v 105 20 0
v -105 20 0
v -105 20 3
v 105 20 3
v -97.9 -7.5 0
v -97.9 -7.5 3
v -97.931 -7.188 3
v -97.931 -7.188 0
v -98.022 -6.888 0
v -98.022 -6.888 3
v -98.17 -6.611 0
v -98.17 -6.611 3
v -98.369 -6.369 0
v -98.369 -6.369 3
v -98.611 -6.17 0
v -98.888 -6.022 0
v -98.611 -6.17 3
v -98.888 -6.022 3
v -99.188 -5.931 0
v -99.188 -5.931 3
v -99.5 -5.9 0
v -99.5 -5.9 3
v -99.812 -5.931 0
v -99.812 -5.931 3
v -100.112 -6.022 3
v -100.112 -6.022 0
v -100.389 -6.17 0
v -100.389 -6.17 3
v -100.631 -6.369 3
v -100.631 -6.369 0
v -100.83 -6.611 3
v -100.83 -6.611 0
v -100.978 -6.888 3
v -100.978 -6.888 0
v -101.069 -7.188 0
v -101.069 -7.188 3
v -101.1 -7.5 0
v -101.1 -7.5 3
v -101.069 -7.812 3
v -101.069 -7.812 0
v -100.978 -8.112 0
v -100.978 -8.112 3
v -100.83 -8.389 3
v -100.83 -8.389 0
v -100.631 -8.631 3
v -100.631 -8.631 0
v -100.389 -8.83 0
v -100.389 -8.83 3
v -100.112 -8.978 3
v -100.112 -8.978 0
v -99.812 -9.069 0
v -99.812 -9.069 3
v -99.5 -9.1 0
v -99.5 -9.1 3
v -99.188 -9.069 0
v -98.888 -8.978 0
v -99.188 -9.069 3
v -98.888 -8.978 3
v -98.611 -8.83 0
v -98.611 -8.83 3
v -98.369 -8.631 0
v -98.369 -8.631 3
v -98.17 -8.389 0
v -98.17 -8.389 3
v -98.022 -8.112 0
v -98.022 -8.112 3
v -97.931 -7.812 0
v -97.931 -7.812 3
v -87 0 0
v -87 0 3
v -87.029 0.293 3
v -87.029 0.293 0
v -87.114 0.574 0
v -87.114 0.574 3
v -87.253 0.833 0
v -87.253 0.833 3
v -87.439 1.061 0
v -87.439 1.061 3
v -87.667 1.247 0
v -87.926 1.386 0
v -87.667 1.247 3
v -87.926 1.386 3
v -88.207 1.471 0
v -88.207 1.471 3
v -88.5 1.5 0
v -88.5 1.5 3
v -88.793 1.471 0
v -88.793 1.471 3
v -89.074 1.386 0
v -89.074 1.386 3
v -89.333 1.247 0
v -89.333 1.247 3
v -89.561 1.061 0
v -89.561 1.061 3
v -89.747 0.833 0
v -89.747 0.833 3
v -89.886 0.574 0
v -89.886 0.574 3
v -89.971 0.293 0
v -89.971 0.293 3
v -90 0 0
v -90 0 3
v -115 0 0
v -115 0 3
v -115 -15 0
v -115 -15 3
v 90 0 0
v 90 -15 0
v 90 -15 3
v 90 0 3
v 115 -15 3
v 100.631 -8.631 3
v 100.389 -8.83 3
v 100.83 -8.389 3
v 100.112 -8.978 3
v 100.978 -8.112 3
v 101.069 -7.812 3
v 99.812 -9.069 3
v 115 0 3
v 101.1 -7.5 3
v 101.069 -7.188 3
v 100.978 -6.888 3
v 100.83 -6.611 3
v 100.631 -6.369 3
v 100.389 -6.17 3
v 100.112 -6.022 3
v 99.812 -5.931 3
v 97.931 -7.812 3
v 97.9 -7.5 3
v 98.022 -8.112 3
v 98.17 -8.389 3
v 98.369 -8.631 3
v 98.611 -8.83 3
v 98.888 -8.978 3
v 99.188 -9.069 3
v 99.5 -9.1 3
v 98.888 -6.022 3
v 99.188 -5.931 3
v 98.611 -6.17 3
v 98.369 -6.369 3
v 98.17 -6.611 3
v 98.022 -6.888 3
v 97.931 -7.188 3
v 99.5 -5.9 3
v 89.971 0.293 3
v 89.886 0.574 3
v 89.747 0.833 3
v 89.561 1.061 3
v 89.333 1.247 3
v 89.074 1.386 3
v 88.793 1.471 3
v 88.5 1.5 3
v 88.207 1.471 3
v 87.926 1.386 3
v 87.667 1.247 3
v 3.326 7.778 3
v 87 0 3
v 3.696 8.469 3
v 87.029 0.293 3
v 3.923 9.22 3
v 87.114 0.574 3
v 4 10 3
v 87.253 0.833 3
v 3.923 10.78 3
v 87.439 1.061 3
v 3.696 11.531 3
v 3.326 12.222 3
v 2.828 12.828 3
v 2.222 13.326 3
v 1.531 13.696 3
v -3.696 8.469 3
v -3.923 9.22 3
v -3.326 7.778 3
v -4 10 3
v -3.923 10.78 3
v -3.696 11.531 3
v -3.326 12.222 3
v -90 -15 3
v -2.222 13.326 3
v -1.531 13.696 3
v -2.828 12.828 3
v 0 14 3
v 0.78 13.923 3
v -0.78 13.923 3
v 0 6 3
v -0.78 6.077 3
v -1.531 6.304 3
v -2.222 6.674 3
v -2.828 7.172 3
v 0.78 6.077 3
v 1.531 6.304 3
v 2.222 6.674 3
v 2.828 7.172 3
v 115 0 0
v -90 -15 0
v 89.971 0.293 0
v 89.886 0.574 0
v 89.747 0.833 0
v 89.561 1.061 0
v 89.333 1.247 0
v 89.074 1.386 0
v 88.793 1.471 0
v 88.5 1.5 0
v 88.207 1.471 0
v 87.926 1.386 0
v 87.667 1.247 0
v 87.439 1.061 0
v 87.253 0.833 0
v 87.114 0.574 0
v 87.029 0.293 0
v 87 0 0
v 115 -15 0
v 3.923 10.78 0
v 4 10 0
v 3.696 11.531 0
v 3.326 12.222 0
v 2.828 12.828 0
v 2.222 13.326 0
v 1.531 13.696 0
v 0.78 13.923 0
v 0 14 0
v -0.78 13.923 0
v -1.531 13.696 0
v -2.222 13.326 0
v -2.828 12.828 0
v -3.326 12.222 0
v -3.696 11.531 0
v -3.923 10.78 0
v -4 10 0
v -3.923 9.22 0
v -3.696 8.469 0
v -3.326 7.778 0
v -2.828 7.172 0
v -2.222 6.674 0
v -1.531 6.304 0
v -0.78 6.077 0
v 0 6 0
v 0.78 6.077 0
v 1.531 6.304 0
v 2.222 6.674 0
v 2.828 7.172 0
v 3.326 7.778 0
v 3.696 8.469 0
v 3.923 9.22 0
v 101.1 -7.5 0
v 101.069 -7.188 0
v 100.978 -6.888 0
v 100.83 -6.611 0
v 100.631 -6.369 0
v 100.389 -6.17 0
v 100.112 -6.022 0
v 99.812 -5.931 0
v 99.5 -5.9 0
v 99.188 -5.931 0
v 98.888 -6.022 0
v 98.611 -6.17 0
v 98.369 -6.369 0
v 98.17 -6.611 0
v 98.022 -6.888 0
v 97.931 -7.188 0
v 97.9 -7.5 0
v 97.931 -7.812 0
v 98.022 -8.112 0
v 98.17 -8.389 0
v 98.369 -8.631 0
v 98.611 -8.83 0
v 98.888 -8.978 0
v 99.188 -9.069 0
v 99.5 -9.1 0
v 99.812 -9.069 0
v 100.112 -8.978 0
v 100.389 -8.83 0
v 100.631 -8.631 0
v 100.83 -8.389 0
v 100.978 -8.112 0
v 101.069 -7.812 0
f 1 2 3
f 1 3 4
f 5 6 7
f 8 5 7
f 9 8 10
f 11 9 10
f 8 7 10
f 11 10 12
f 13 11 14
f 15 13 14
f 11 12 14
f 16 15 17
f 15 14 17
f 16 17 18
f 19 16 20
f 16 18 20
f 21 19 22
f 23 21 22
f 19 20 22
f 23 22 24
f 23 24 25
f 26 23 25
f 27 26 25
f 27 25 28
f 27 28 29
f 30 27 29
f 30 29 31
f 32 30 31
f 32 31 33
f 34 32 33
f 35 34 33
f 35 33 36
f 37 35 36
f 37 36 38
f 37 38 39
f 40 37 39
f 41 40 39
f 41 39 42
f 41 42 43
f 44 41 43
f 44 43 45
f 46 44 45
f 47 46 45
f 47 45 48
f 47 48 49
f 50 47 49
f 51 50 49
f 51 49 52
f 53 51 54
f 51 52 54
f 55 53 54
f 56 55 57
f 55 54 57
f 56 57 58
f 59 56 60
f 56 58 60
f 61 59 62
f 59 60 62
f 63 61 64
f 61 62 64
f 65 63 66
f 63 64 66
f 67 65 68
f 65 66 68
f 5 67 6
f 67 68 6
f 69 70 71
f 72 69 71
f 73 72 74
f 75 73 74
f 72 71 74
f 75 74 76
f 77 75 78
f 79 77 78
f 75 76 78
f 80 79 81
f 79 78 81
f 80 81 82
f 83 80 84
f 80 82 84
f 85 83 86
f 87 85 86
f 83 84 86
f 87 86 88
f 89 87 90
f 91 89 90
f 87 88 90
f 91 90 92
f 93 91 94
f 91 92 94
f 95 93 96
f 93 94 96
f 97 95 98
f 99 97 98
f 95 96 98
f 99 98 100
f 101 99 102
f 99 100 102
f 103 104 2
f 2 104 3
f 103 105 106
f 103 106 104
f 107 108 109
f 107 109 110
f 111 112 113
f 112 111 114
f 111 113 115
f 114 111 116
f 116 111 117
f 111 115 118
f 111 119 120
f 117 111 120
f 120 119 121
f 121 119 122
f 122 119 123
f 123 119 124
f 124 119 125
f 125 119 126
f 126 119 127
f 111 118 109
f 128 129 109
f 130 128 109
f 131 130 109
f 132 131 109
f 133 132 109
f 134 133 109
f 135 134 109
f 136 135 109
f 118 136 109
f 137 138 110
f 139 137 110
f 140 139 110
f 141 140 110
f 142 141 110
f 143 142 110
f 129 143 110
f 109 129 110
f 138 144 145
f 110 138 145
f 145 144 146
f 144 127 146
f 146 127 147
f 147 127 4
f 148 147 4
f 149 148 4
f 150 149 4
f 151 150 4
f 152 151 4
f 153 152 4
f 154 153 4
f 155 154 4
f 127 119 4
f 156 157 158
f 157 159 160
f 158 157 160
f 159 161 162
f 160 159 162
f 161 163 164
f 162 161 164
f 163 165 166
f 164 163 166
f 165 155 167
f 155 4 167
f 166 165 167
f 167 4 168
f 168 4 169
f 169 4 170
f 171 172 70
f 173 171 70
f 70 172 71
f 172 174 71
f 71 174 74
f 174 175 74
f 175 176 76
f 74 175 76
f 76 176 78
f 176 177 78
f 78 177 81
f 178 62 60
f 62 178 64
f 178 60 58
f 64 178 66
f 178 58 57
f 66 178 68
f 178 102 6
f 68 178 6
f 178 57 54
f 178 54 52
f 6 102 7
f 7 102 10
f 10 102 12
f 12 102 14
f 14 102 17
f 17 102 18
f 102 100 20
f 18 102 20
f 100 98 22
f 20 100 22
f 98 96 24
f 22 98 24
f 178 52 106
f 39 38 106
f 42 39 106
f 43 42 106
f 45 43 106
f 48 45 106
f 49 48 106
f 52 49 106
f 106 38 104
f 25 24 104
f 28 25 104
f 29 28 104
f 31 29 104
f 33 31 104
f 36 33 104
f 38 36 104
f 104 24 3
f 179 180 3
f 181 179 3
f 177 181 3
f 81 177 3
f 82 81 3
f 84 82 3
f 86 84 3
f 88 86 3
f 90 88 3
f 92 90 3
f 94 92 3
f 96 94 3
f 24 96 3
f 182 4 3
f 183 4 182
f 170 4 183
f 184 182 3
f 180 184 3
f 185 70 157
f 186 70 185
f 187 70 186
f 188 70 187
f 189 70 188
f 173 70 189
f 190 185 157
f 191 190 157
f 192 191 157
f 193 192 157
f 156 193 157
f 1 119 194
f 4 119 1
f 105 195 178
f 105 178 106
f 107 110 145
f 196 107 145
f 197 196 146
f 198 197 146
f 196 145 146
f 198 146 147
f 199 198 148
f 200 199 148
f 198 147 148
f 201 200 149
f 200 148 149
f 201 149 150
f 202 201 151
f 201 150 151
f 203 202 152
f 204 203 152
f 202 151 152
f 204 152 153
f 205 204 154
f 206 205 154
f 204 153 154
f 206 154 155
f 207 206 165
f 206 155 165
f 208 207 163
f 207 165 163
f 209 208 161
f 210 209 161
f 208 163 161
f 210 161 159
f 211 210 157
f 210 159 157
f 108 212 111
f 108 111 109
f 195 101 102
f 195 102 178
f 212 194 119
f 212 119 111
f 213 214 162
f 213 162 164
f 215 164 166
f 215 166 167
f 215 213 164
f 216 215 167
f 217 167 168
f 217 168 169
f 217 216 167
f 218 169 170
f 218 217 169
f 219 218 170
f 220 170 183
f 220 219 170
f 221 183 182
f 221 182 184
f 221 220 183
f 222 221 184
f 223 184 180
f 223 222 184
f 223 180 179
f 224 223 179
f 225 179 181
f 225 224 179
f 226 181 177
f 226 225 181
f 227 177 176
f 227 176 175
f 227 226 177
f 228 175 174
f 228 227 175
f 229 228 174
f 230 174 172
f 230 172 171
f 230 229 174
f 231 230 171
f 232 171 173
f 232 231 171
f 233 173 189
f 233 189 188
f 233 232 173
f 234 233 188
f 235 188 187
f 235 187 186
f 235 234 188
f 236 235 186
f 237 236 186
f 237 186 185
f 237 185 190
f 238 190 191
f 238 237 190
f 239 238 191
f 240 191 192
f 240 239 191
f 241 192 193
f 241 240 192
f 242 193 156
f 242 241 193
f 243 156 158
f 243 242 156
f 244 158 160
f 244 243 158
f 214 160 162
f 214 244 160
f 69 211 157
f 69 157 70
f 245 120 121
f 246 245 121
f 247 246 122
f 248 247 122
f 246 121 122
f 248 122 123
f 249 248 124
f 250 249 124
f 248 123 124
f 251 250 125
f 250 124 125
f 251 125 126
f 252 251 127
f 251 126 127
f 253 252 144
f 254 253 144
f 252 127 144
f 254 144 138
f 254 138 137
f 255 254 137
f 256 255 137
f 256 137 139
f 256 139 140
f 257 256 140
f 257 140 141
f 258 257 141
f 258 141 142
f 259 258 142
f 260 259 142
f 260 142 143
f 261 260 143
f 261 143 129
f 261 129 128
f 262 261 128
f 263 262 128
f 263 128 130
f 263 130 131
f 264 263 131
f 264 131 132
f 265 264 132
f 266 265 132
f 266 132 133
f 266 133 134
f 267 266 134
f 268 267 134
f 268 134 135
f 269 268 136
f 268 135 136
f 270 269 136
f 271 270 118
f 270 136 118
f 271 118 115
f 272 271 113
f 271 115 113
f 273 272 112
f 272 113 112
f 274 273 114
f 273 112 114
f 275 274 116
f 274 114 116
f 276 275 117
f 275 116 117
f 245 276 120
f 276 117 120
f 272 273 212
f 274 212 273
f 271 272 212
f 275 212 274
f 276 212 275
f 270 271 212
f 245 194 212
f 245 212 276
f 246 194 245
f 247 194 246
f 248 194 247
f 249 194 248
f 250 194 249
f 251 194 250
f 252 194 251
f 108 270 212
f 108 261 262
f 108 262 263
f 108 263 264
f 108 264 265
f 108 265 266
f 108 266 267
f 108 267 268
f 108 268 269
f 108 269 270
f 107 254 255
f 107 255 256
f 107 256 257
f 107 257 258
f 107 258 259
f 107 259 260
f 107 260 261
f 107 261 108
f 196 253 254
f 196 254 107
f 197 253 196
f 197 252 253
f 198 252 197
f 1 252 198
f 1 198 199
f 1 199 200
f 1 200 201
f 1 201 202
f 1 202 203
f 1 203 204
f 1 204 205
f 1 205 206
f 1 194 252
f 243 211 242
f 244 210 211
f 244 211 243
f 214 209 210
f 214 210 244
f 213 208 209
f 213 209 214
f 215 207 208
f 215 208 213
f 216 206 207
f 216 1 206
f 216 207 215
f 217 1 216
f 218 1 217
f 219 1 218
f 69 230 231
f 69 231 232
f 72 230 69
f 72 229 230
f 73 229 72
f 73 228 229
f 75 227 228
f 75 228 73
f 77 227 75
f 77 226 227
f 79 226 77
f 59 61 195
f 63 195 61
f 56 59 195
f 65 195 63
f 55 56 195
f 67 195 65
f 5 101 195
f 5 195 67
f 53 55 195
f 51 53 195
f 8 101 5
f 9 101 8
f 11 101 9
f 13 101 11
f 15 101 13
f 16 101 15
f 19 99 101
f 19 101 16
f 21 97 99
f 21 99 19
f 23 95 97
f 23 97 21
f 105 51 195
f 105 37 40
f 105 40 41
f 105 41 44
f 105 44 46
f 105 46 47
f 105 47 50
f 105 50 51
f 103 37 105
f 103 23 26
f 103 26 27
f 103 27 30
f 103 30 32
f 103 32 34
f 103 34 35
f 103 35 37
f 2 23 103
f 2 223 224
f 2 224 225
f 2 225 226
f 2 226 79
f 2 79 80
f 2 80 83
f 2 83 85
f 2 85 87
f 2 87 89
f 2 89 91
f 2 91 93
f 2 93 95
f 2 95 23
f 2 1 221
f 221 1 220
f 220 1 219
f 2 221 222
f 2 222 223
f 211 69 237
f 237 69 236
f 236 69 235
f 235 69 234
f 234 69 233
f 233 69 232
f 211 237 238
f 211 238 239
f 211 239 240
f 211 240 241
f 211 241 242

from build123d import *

# Parameters (mm, degrees)
SKETCH_1_R          = 4
EXTRUDE_1_DEPTH     = 3
SKETCH_2_R          = 1.5
CUT_EXTRUDE_1_DEPTH = 4
EXTRUDE_2_DEPTH     = 3
CUT_EXTRUDE_2_REACH = 5
SKETCH_4_R          = 1.6


with BuildPart() as part:
    # 草图1 → 凸台-拉伸1 (new body)
    with BuildSketch(Plane.XY):
        Polygon((90, 0), (-90, 0), (-90, -15), (-115, -15), (-115, 0), (-105, 0), (-105, 20), (105, 20), (105, 0), (115, 0), (115, -15), (90, -15), align=None)
        with Locations((0, 10)):
            Circle(SKETCH_1_R, mode=Mode.SUBTRACT)
    extrude(amount=EXTRUDE_1_DEPTH)

    # 草图2 → 切除-拉伸1 (cut, through all)
    with BuildSketch(Plane.XY.offset(3)):
        with Locations((-88.5, 0)):
            Circle(SKETCH_2_R)
        with Locations((88.5, 0)):
            Circle(SKETCH_2_R)
    extrude(amount=-CUT_EXTRUDE_1_DEPTH, mode=Mode.SUBTRACT)

    # 草图3 → 凸台-拉伸2 (add)
    with BuildSketch(Plane.XY.offset(3)):
        Polygon((-115, 0), (-105, 20), (-105, 0), align=None)
        Polygon((105, 20), (105, 0), (115, 0), align=None)
    extrude(amount=-EXTRUDE_2_DEPTH)

    # 草图4 → 切除-拉伸2 (cut, up to next)
    with BuildSketch(Plane.XY.offset(3), mode=Mode.PRIVATE) as cut_extrude_2_sk1:
        with Locations((-99.5, -7.5)):
            Circle(SKETCH_4_R)
    cut_extrude_2_tool1 = extrude(cut_extrude_2_sk1.sketch, amount=-CUT_EXTRUDE_2_REACH, mode=Mode.PRIVATE) & part.part
    add(cut_extrude_2_tool1.solids().sort_by_distance((-99.5, -7.5, 3))[0], mode=Mode.SUBTRACT)
    # 草图4 → 切除-拉伸2 (cut, up to next)
    with BuildSketch(Plane.XY.offset(3), mode=Mode.PRIVATE) as cut_extrude_2_sk2:
        with Locations((99.5, -7.5)):
            Circle(SKETCH_4_R)
    cut_extrude_2_tool2 = extrude(cut_extrude_2_sk2.sketch, amount=-CUT_EXTRUDE_2_REACH, mode=Mode.PRIVATE) & part.part
    add(cut_extrude_2_tool2.solids().sort_by_distance((99.5, -7.5, 3))[0], mode=Mode.SUBTRACT)


solid = part.part
